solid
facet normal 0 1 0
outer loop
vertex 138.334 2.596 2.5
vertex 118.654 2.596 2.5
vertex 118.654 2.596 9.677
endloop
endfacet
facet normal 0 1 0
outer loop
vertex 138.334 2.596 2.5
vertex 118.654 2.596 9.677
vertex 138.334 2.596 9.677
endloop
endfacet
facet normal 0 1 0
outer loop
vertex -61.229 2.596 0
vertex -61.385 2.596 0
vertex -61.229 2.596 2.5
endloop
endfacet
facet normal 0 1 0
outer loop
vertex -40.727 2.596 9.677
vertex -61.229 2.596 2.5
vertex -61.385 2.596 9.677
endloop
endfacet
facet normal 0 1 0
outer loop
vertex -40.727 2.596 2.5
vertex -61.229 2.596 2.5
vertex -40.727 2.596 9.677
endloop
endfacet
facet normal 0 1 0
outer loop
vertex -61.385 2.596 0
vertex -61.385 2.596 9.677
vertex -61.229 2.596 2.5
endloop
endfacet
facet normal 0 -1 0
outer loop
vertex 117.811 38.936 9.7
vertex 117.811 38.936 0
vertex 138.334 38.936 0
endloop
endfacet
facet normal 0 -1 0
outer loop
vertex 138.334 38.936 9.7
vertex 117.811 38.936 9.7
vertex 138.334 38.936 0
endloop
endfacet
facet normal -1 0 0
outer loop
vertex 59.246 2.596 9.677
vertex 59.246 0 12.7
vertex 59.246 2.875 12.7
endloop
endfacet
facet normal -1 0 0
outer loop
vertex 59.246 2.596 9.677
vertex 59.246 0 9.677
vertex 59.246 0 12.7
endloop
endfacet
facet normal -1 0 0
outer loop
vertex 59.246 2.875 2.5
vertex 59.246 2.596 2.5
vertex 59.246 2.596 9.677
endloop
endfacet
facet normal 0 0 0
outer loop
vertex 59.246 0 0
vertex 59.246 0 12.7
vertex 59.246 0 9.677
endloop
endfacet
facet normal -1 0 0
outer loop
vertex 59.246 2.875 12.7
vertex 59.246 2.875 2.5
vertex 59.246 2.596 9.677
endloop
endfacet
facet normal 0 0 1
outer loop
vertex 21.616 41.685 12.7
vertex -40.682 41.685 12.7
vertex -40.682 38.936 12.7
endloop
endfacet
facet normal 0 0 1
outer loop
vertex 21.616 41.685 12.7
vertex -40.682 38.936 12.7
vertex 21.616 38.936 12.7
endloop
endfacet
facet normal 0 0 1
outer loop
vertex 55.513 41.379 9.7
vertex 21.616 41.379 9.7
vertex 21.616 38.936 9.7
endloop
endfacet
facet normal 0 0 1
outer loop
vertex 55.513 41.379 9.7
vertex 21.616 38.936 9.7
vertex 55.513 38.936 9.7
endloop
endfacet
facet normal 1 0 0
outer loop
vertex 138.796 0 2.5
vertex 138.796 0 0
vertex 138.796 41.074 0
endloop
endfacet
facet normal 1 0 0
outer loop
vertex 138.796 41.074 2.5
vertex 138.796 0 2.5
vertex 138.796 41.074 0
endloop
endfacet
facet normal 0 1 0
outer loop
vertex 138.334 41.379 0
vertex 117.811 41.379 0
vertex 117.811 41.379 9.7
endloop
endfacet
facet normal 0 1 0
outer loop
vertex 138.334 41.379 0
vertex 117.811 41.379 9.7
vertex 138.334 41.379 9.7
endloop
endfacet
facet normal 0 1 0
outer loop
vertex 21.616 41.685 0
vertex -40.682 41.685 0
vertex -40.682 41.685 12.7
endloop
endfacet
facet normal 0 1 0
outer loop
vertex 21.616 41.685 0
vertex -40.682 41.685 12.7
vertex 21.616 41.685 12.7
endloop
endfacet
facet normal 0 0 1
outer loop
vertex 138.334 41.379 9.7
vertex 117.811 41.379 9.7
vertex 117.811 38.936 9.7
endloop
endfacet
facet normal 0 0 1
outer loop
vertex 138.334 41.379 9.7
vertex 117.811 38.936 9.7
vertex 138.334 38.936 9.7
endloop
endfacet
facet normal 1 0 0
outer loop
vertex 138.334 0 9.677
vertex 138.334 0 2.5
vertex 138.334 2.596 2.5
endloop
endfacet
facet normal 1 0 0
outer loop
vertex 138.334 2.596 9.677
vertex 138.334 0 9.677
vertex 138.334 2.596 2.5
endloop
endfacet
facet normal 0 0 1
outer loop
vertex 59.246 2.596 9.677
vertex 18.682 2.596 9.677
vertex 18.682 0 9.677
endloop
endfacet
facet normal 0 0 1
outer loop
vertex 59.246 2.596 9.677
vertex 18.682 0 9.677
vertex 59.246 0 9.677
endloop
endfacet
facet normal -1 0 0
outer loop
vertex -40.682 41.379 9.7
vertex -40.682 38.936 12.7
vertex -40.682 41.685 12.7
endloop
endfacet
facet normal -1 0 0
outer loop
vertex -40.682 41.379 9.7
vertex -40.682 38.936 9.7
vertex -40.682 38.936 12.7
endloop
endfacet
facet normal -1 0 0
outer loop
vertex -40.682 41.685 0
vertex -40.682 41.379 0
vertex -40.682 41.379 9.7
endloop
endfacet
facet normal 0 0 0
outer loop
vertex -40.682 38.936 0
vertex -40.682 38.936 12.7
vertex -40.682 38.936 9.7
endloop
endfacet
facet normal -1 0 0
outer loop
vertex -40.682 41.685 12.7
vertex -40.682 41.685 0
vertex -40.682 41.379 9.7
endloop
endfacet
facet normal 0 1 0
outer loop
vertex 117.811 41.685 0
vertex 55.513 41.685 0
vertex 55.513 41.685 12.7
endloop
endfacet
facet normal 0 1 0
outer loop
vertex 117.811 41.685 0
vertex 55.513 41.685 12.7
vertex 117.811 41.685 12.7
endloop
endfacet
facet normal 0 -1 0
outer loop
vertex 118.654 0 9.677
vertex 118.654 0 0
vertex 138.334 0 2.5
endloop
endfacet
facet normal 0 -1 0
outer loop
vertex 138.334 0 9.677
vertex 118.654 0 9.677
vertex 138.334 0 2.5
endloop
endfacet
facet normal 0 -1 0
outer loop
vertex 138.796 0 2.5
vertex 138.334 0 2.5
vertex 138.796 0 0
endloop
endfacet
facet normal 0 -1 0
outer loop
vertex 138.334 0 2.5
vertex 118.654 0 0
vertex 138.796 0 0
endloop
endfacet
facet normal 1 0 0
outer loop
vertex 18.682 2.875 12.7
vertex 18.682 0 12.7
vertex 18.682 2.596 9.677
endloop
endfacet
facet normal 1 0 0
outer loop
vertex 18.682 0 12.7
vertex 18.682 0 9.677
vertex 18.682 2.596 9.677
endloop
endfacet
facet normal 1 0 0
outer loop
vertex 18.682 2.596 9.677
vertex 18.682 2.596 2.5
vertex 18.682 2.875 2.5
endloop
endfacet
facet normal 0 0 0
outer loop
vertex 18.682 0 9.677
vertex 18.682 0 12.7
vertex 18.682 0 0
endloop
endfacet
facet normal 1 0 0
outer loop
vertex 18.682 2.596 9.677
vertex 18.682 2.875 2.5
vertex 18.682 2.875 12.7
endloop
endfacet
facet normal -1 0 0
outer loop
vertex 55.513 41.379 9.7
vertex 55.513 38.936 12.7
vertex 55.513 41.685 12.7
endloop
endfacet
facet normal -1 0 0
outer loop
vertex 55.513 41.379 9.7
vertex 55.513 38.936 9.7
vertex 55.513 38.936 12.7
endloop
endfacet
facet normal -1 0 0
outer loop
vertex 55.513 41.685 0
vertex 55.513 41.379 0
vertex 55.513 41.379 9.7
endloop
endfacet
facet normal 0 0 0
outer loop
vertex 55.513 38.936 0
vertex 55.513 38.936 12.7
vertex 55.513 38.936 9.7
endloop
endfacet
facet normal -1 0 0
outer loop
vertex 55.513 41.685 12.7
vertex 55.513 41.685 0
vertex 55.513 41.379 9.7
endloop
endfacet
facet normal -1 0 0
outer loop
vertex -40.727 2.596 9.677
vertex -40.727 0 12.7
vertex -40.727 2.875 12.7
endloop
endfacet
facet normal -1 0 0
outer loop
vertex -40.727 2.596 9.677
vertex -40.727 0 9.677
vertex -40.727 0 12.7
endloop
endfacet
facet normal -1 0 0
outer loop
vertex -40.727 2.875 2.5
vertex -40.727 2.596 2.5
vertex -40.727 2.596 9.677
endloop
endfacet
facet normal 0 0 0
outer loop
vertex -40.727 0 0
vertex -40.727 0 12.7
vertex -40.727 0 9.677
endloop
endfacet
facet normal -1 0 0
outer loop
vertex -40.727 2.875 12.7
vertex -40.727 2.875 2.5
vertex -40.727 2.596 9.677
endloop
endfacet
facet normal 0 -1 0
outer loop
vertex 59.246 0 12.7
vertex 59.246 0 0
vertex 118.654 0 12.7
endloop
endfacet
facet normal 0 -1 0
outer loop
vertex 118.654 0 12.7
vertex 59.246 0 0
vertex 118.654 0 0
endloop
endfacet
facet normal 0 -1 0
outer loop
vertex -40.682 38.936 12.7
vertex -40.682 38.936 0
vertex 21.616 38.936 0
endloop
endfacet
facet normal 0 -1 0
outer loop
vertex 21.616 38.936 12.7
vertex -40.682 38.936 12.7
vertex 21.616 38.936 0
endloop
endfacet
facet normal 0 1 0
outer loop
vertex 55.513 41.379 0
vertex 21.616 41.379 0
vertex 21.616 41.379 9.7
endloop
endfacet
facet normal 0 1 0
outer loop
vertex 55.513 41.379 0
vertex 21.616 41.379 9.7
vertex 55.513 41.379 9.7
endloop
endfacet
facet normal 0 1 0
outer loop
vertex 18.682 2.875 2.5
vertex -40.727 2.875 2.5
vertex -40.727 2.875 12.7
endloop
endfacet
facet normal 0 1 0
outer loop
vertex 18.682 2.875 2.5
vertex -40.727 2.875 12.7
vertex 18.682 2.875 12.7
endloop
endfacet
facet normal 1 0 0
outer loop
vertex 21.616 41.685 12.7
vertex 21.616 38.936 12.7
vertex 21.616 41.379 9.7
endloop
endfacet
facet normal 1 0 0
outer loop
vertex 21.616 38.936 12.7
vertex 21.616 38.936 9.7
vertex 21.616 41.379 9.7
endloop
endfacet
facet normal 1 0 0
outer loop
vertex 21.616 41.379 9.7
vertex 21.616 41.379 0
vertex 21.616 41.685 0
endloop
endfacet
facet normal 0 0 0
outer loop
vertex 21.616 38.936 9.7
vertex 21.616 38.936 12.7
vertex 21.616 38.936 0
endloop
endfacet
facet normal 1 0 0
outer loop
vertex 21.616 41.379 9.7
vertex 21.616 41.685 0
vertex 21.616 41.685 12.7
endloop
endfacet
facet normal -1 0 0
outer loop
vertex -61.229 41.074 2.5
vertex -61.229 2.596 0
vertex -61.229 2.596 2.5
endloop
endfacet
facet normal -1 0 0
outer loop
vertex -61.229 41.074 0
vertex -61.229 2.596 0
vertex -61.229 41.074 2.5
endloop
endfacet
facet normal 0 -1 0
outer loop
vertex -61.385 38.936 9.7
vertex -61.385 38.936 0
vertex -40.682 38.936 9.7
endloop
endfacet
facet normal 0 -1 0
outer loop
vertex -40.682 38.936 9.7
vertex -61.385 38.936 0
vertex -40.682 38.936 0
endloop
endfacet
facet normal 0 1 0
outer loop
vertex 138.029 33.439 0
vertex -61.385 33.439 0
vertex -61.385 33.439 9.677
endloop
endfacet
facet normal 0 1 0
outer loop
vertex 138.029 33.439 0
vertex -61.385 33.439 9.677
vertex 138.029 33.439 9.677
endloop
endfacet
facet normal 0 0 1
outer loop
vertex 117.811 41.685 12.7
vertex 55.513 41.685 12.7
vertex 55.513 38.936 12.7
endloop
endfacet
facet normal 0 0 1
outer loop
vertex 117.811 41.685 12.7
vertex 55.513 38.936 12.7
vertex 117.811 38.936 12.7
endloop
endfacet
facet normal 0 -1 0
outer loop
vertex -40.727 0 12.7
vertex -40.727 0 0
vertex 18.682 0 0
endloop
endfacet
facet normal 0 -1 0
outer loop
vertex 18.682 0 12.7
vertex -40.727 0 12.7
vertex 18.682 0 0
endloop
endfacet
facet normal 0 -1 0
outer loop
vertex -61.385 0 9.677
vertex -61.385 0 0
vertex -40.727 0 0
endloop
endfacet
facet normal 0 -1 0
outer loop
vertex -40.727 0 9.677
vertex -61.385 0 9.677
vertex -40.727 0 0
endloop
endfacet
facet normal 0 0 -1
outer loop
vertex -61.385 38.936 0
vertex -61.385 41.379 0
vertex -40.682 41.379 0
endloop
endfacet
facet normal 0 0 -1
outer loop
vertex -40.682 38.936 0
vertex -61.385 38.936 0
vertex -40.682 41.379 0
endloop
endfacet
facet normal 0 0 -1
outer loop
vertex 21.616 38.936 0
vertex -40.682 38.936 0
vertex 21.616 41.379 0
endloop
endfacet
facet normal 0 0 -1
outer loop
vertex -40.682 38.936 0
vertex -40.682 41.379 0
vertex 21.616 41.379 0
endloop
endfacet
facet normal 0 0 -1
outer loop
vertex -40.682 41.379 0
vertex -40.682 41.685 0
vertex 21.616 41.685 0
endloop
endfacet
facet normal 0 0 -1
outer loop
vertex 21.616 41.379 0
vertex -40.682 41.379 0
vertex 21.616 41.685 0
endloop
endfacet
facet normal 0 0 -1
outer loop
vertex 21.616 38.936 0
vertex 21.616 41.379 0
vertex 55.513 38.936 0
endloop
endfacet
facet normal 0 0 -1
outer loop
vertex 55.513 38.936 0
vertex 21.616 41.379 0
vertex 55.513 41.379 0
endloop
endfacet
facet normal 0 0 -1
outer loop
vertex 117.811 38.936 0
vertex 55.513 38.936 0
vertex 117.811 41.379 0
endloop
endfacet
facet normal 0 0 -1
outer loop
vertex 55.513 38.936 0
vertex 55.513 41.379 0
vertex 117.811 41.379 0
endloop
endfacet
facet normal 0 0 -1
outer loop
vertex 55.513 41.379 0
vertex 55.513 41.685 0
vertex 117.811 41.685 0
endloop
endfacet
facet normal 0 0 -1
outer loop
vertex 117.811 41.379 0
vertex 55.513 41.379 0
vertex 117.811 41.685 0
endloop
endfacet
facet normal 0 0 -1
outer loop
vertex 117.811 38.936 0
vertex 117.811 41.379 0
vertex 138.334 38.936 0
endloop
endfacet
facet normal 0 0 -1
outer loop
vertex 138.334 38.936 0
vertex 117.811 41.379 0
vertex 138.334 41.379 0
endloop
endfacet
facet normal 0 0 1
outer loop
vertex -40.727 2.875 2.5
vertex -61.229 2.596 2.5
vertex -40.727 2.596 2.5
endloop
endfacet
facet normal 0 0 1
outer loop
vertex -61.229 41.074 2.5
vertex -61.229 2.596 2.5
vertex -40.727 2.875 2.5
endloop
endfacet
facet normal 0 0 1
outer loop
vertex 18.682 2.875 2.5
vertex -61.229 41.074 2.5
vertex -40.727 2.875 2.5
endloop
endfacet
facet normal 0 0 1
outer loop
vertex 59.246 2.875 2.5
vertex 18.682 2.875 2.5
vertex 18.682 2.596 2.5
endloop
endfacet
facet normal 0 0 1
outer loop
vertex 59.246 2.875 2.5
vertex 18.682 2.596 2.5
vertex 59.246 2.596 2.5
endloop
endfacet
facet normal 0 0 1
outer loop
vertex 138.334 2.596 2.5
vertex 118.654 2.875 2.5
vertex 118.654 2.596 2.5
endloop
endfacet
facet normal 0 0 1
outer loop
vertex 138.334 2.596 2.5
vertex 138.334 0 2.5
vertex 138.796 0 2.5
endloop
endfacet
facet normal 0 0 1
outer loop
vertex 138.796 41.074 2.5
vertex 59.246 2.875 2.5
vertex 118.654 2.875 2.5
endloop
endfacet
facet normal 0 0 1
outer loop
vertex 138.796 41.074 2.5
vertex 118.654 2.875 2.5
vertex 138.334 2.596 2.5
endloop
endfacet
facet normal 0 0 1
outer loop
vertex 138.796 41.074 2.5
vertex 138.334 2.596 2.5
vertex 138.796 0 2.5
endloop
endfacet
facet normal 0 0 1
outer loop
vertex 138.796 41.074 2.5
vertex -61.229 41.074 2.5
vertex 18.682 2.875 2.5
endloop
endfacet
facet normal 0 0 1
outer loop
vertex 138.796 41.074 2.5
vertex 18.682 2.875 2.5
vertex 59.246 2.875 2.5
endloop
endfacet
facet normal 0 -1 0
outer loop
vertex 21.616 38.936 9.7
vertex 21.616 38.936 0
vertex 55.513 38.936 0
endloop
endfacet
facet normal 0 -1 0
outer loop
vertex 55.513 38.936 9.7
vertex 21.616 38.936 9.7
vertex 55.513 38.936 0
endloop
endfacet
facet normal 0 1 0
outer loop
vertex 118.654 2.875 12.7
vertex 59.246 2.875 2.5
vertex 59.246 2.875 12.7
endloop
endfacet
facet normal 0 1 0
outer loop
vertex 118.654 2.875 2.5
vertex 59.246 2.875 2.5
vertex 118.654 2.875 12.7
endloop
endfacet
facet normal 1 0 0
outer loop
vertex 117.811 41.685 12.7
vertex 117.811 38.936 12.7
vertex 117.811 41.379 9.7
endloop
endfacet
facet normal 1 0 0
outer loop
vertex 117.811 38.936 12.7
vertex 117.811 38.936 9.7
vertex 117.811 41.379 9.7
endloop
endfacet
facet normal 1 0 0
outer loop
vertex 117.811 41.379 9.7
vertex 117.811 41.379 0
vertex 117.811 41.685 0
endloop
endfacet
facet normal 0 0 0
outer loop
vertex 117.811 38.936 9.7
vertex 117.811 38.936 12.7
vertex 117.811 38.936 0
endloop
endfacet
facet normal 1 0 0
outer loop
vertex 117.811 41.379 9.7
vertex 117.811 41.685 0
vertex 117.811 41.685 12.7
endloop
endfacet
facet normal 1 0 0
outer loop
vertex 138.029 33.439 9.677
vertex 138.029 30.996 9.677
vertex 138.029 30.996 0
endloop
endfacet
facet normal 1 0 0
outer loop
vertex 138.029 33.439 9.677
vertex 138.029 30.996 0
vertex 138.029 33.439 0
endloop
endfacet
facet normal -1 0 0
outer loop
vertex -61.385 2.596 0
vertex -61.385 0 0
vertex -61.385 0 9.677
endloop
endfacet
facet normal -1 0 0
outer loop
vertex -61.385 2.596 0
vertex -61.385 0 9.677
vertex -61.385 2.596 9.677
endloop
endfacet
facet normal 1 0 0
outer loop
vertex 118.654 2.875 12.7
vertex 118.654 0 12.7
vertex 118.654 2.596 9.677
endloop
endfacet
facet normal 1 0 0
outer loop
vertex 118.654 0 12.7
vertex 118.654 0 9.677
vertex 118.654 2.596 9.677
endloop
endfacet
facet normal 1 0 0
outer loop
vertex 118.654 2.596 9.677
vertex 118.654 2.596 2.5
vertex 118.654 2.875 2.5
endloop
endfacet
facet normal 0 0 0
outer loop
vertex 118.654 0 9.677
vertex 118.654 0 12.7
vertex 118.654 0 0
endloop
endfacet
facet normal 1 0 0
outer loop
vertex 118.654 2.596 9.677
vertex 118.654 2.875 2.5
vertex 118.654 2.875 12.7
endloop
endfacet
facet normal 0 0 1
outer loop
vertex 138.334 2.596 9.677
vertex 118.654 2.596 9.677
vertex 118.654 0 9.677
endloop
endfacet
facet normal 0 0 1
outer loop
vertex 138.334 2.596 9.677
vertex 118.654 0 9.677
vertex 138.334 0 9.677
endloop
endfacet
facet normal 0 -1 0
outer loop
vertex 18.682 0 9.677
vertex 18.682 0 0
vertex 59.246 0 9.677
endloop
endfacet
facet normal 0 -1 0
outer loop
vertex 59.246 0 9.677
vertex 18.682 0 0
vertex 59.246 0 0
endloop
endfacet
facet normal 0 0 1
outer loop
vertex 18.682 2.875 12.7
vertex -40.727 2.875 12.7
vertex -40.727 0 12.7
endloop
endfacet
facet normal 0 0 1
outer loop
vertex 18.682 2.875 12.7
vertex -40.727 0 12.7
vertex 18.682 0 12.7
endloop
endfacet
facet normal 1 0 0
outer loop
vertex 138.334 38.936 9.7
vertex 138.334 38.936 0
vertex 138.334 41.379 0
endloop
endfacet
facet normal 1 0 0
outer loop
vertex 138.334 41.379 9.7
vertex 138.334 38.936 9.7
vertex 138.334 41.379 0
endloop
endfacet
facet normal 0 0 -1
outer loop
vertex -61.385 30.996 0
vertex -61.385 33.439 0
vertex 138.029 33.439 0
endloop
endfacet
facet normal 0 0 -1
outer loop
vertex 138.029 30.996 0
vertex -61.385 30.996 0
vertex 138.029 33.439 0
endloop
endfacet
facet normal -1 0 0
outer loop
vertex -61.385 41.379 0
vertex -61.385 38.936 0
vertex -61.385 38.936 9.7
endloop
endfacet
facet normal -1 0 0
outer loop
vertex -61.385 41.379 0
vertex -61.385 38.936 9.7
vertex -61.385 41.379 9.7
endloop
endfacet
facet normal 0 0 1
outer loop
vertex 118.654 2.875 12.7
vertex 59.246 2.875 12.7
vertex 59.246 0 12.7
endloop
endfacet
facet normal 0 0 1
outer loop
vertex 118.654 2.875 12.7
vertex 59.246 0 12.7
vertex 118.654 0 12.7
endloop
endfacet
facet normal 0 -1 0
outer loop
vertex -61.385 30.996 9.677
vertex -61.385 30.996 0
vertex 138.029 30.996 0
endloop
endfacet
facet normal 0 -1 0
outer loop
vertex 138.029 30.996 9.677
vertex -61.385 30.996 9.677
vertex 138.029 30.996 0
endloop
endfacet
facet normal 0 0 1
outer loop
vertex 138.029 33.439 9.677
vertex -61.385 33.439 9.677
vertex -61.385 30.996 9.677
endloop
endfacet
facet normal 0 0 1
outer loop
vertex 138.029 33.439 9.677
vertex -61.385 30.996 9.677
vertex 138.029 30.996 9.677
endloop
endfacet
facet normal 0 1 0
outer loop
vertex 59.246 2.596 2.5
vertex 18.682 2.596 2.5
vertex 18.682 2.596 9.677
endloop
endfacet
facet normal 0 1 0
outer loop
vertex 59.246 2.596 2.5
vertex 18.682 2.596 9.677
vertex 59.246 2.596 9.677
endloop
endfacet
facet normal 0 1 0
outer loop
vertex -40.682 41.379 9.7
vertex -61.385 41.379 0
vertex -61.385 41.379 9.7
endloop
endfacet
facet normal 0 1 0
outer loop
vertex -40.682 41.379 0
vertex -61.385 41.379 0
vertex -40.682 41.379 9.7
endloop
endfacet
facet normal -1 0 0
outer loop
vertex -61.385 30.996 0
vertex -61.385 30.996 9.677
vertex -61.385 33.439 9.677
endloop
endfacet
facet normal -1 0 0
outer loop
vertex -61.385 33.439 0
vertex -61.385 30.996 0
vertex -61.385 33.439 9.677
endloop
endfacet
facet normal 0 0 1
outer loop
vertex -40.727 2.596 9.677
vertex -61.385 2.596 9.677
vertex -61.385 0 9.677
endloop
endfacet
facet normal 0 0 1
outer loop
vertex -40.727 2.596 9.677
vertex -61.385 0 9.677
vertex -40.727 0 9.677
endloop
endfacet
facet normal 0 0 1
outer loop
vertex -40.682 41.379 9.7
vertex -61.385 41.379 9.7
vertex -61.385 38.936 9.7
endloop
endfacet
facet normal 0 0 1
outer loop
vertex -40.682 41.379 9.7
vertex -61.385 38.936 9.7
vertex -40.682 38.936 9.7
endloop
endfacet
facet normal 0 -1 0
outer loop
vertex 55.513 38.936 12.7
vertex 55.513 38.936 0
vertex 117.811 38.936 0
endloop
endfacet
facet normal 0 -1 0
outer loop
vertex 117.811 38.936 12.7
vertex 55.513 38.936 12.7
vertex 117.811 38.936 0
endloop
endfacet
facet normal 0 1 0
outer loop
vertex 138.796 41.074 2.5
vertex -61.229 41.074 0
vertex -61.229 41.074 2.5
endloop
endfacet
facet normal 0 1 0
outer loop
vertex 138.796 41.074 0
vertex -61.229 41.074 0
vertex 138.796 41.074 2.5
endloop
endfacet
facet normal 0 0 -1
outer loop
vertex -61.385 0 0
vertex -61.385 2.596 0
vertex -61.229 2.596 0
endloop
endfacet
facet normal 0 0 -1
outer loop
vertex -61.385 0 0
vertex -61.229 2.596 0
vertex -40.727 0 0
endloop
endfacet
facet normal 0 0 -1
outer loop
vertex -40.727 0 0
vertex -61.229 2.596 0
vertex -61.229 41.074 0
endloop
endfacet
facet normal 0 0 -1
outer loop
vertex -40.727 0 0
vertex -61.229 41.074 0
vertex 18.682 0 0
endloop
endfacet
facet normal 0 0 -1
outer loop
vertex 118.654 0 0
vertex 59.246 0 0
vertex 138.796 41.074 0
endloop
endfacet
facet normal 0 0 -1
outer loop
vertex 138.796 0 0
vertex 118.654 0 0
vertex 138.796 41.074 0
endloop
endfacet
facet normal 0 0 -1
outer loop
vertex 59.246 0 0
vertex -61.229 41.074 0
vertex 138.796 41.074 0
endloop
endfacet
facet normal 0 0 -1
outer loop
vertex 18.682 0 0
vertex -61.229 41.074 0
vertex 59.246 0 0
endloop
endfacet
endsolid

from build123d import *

# Parameters (mm, degrees)
F1_W      = 199.719626
F1_H      = 2.443053
F2_DEPTH  = 9.700006
F3_W      = 62.29786
F3_H      = 2.748434
F3_W_2    = 62.297862
F4_DEPTH  = 12.7
F5_W      = 199.414242
F5_H      = 2.443051
F6_DEPTH  = 9.6774
F0_W      = 200.025
F0_H      = 41.073836
F7_DEPTH  = 2.5
F10_W     = 199.719626
F10_H     = 2.595744
F11_DEPTH = 9.6774
F12_W     = 59.408624
F12_H     = 2.874611
F13_DEPTH = 12.7


with BuildPart() as f2:
    # F1 (on Top) → F2 (new body)
    with BuildSketch(Plane.XY):
        with Locations((38.474461, 40.157691)):
            Rectangle(F1_W, F1_H)
    extrude(amount=F2_DEPTH)

    # F3 (on Top) → F4 (join)
    with BuildSketch(Plane.XY):
        with Locations((-9.533371, 40.310381)):
            Rectangle(F3_W, F3_H)
        with Locations((86.661862, 40.310381)):
            Rectangle(F3_W_2, F3_H)
    extrude(amount=F4_DEPTH)


with BuildPart() as f6:
    # F5 (on Top) → F6 (new body)
    with BuildSketch(Plane.XY):
        with Locations((38.321769, 32.217768)):
            Rectangle(F5_W, F5_H)
    extrude(amount=F6_DEPTH)


with BuildPart() as f7:
    # F0 (on Top) → F7 (new body)
    with BuildSketch(Plane.XY):
        with Locations((38.783472, 20.536918)):
            Rectangle(F0_W, F0_H)
    extrude(amount=F7_DEPTH)

    # F10 (on Top) → F11 (join)
    with BuildSketch(Plane.XY):
        with Locations((38.474461, 1.297872)):
            Rectangle(F10_W, F10_H)
    extrude(amount=F11_DEPTH)

    # F12 (on Top) → F13 (join)
    with BuildSketch(Plane.XY):
        with Locations((-11.022674, 1.437305)):
            Rectangle(F12_W, F12_H)
        with Locations((88.949902, 1.437305)):
            Rectangle(F12_W, F12_H)
    extrude(amount=F13_DEPTH)


with BuildPart() as f8_1:
    # F8: instance of F2
    add(f2.part.mirror(Plane.XZ))


solid = Compound([f2.part, f6.part, f7.part])
